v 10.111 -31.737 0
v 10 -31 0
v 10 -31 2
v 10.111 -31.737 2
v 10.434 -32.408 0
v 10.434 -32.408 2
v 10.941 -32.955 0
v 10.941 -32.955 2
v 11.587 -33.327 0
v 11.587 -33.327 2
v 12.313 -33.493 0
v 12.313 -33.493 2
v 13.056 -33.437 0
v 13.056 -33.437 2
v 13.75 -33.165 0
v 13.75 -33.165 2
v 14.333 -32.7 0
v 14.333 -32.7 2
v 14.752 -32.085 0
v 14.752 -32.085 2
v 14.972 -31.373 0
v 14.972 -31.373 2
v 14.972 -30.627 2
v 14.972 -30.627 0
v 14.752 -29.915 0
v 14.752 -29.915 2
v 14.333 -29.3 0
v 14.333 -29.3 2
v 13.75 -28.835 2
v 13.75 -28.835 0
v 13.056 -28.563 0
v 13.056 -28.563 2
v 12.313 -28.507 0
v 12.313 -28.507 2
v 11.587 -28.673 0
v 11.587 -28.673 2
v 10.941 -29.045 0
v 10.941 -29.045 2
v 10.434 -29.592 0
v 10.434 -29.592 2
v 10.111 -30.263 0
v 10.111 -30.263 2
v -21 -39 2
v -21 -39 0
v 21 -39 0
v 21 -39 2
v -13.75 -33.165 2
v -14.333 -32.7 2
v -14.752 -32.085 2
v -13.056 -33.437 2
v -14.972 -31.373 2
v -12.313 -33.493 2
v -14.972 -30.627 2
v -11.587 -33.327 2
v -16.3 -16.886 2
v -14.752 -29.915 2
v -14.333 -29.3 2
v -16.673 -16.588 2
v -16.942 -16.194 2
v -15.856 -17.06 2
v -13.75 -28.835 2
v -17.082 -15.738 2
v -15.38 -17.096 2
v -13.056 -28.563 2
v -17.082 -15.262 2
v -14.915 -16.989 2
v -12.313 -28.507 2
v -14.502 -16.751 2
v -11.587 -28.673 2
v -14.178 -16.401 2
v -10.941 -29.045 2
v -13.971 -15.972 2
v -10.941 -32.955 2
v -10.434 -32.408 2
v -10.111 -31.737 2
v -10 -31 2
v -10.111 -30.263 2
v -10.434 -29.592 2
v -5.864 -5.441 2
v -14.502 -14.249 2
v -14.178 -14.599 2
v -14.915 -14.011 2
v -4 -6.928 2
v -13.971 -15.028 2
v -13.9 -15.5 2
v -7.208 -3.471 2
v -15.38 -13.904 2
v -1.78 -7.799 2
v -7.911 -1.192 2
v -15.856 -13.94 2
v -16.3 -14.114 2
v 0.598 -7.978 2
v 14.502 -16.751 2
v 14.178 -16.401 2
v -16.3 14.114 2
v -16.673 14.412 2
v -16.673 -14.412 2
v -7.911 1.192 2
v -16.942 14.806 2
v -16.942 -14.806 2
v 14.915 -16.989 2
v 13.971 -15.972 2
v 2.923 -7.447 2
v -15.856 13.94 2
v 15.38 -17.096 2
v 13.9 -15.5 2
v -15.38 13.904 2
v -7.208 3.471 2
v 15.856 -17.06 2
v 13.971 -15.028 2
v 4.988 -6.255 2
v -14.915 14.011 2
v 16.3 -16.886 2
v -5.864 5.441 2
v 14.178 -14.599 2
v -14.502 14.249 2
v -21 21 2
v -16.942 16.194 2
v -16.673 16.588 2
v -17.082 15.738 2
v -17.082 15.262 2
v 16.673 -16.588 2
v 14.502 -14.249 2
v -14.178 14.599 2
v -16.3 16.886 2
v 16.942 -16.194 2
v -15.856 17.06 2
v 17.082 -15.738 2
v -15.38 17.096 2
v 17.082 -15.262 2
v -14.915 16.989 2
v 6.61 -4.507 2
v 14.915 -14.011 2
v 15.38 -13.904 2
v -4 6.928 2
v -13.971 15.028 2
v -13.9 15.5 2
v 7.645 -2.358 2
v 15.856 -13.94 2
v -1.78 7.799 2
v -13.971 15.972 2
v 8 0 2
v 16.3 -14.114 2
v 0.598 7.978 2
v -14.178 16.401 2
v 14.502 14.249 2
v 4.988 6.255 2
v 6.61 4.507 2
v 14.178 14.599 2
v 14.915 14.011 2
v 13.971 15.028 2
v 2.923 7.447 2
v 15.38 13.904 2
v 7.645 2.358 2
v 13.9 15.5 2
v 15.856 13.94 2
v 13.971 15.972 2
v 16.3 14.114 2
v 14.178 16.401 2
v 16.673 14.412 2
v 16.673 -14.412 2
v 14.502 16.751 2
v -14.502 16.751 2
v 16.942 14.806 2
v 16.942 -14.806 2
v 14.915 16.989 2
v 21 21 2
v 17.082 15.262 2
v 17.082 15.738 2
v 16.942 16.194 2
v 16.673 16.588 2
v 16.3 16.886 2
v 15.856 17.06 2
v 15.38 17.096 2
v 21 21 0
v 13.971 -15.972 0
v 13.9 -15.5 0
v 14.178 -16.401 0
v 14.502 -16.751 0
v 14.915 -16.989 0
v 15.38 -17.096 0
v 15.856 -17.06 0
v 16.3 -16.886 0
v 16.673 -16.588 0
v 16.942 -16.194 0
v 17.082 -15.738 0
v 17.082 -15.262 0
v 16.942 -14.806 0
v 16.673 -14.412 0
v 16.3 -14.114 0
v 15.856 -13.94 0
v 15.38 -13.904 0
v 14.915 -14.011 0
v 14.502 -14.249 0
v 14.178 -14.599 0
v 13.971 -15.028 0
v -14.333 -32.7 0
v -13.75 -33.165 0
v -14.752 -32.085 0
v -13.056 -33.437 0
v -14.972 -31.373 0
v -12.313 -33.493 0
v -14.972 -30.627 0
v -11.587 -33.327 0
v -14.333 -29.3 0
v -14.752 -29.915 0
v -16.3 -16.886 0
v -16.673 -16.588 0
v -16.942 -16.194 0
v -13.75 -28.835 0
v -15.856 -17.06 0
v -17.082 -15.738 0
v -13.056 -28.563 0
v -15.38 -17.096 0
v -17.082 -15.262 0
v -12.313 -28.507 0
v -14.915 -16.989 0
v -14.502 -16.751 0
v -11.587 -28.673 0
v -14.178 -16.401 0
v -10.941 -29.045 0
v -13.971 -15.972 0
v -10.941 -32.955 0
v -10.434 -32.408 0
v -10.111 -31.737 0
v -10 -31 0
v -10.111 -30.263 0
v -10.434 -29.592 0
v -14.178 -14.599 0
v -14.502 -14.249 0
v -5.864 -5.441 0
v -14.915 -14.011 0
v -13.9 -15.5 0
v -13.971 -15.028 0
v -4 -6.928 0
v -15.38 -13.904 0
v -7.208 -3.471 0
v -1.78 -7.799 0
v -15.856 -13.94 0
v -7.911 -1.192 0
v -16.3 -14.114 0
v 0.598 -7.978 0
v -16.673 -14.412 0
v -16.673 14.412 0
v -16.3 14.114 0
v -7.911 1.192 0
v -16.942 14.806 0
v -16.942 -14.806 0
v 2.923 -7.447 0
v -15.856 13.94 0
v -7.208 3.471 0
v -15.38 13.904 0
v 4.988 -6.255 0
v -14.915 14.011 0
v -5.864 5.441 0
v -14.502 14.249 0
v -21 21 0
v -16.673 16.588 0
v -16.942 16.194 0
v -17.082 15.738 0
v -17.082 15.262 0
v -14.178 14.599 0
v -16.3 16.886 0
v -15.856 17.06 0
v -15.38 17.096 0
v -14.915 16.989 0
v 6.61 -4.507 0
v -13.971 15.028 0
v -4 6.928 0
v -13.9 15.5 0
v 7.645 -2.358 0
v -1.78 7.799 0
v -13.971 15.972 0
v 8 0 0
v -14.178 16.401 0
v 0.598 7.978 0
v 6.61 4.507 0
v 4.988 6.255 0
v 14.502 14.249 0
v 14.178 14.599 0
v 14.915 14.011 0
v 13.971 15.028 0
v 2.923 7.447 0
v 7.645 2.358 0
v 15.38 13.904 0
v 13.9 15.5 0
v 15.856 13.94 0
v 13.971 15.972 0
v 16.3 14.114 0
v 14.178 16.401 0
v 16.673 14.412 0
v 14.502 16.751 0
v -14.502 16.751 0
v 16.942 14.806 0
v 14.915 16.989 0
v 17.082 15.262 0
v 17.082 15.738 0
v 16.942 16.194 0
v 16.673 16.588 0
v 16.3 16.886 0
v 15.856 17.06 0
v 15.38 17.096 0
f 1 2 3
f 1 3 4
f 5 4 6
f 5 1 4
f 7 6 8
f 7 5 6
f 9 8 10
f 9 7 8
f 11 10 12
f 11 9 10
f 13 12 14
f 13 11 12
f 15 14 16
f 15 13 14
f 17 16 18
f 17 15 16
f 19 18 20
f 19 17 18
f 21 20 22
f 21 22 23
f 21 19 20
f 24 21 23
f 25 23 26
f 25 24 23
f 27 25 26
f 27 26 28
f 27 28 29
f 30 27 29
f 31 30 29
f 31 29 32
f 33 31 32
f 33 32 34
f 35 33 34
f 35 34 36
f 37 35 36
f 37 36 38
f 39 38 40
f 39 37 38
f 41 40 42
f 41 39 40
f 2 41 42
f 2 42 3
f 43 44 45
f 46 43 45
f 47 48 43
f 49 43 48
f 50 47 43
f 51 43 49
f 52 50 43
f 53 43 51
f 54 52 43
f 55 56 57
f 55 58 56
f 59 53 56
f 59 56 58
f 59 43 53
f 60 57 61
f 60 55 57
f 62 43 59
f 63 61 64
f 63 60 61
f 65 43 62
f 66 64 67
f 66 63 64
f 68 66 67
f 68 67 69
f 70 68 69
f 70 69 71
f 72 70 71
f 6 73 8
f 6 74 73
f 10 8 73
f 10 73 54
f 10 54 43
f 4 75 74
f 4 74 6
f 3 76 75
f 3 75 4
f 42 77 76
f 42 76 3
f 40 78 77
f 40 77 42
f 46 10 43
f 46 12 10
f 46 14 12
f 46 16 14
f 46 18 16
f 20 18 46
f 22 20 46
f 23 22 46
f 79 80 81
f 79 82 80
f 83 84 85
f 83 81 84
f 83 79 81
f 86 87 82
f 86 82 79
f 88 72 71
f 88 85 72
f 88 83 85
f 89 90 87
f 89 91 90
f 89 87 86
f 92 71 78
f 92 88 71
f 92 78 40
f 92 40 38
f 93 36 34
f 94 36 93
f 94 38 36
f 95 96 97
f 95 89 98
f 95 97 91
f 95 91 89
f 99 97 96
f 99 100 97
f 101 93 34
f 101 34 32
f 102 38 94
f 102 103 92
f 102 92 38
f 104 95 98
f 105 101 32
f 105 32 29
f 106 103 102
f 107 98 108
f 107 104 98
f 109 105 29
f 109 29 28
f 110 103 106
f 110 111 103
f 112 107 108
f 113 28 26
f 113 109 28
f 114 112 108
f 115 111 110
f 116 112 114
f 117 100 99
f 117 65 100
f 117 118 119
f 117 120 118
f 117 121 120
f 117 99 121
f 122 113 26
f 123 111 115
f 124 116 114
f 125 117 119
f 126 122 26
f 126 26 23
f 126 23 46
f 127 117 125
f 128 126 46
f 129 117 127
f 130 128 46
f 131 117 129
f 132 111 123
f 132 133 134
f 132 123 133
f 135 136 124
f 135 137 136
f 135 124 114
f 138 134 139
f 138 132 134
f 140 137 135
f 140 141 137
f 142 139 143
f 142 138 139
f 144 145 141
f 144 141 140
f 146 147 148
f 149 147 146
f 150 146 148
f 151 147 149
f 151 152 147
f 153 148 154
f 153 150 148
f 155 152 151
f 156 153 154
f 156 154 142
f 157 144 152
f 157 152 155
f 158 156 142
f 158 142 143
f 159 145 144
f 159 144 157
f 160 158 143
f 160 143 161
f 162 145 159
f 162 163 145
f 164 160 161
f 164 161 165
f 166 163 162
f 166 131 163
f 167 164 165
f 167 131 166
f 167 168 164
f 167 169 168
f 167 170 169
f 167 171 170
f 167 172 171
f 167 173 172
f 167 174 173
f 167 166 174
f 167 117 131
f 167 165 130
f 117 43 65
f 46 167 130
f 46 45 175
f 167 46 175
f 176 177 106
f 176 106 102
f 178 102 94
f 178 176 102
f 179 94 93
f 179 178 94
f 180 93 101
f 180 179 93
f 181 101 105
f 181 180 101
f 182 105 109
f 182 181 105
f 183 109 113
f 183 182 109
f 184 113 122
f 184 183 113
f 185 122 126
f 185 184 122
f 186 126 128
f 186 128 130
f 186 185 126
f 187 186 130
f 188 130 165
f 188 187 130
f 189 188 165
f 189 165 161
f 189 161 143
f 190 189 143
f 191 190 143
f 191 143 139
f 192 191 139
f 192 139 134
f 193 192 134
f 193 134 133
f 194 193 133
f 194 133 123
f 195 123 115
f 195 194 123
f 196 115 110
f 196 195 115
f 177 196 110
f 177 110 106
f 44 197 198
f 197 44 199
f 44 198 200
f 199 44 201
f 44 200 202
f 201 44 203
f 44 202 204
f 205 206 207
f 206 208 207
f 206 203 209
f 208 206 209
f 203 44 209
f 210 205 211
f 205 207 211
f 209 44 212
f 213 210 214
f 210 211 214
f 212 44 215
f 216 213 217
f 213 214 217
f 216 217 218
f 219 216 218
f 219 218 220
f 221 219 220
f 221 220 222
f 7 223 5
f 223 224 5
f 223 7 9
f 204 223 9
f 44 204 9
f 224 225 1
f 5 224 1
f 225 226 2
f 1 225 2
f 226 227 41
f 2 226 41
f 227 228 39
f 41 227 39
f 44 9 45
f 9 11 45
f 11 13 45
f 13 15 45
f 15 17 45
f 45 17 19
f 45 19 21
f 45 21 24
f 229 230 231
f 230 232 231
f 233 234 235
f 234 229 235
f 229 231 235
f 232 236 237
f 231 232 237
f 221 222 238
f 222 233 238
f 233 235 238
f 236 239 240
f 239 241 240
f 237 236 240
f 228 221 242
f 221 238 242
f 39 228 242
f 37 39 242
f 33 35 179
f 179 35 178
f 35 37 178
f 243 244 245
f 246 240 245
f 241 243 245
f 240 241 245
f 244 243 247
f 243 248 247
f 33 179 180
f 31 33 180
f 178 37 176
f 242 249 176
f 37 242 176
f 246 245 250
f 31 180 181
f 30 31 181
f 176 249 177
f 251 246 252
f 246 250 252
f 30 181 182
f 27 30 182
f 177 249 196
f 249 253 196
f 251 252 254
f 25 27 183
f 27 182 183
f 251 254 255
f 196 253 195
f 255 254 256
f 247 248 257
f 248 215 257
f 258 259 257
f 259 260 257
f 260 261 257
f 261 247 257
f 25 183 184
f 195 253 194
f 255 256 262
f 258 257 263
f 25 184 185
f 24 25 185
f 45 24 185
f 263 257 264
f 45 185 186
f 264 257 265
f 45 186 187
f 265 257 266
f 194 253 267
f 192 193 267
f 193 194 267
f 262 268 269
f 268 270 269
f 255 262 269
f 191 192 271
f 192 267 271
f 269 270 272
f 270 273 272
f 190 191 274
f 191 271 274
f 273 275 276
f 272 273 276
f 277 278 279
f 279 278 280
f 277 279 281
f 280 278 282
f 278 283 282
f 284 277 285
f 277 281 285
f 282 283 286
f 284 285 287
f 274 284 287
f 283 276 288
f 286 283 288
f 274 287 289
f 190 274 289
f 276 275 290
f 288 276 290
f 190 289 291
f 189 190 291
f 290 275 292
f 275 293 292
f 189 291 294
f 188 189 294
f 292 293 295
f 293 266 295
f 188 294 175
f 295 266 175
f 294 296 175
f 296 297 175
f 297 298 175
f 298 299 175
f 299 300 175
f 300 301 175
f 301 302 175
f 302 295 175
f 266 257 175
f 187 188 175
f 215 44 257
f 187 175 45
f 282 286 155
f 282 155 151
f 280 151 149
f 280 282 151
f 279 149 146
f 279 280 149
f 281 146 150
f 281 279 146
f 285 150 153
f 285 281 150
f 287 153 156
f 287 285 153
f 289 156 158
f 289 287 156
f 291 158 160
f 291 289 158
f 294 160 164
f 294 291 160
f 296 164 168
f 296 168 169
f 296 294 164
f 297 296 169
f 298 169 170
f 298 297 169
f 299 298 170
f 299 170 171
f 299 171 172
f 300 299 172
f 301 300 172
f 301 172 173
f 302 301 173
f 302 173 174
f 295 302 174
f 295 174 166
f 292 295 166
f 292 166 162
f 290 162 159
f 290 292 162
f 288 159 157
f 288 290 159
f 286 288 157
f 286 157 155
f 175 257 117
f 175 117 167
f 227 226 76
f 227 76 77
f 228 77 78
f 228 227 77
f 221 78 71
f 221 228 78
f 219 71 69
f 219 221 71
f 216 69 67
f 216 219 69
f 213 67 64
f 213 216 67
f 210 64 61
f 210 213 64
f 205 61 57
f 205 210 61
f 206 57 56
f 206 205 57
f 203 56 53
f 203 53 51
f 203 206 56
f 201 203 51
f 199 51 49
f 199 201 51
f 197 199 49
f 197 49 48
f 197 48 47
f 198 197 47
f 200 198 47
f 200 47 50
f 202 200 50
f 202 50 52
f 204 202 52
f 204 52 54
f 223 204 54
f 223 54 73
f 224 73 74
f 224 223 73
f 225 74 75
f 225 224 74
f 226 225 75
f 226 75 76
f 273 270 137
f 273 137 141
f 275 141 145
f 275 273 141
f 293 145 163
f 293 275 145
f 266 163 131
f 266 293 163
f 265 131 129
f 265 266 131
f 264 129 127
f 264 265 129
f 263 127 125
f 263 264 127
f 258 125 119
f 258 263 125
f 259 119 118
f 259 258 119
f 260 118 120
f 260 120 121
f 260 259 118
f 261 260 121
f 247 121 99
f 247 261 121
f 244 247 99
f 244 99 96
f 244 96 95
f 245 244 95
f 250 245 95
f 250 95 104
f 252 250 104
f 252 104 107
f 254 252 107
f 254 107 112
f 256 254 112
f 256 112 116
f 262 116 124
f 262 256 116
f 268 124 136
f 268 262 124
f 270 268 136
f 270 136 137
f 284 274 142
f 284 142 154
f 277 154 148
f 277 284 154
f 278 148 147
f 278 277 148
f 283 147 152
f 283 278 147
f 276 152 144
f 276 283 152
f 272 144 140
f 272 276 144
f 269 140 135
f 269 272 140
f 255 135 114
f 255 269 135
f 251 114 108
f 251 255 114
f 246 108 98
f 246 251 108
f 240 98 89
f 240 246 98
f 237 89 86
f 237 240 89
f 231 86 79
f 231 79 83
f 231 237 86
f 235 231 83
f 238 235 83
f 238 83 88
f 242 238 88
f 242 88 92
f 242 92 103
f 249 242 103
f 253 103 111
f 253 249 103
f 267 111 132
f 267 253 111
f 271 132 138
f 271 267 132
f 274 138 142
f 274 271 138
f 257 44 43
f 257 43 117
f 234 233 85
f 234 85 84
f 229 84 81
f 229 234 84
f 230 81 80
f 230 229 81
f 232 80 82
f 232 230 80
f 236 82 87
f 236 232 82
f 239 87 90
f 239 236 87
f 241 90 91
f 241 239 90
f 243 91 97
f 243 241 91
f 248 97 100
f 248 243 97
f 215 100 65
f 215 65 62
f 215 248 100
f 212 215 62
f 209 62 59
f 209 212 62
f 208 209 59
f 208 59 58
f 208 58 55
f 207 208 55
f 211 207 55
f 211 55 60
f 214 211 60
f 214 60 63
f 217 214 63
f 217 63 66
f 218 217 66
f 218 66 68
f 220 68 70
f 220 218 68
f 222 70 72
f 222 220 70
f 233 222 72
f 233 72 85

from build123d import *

# Parameters (mm, degrees)
SKETCH_1_W      = 42
SKETCH_1_H      = 60
SKETCH_1_R      = 8
SKETCH_1_R_2    = 1.6
SKETCH_1_R_3    = 2.5
EXTRUDE_1_DEPTH = 2


with BuildPart() as part:
    # 草图1 → 凸台-拉伸1 (new body)
    with BuildSketch(Plane.XY):
        with Locations((0, -9)):
            Rectangle(SKETCH_1_W, SKETCH_1_H)
        Circle(SKETCH_1_R, mode=Mode.SUBTRACT)
        with Locations((-15.5, 15.5)):
            Circle(SKETCH_1_R_2, mode=Mode.SUBTRACT)
        with Locations((-15.5, -15.5)):
            Circle(SKETCH_1_R_2, mode=Mode.SUBTRACT)
        with Locations((-12.5, -31)):
            Circle(SKETCH_1_R_3, mode=Mode.SUBTRACT)
        with Locations(Location((15.5, 15.5, 0), (0, 0, 180))):
            Circle(SKETCH_1_R_2, mode=Mode.SUBTRACT)
        with Locations(Location((15.5, -15.5, 0), (0, 0, 180))):
            Circle(SKETCH_1_R_2, mode=Mode.SUBTRACT)
        with Locations(Location((12.5, -31, 0), (0, 0, 180))):
            Circle(SKETCH_1_R_3, mode=Mode.SUBTRACT)
    extrude(amount=EXTRUDE_1_DEPTH)


solid = part.part
